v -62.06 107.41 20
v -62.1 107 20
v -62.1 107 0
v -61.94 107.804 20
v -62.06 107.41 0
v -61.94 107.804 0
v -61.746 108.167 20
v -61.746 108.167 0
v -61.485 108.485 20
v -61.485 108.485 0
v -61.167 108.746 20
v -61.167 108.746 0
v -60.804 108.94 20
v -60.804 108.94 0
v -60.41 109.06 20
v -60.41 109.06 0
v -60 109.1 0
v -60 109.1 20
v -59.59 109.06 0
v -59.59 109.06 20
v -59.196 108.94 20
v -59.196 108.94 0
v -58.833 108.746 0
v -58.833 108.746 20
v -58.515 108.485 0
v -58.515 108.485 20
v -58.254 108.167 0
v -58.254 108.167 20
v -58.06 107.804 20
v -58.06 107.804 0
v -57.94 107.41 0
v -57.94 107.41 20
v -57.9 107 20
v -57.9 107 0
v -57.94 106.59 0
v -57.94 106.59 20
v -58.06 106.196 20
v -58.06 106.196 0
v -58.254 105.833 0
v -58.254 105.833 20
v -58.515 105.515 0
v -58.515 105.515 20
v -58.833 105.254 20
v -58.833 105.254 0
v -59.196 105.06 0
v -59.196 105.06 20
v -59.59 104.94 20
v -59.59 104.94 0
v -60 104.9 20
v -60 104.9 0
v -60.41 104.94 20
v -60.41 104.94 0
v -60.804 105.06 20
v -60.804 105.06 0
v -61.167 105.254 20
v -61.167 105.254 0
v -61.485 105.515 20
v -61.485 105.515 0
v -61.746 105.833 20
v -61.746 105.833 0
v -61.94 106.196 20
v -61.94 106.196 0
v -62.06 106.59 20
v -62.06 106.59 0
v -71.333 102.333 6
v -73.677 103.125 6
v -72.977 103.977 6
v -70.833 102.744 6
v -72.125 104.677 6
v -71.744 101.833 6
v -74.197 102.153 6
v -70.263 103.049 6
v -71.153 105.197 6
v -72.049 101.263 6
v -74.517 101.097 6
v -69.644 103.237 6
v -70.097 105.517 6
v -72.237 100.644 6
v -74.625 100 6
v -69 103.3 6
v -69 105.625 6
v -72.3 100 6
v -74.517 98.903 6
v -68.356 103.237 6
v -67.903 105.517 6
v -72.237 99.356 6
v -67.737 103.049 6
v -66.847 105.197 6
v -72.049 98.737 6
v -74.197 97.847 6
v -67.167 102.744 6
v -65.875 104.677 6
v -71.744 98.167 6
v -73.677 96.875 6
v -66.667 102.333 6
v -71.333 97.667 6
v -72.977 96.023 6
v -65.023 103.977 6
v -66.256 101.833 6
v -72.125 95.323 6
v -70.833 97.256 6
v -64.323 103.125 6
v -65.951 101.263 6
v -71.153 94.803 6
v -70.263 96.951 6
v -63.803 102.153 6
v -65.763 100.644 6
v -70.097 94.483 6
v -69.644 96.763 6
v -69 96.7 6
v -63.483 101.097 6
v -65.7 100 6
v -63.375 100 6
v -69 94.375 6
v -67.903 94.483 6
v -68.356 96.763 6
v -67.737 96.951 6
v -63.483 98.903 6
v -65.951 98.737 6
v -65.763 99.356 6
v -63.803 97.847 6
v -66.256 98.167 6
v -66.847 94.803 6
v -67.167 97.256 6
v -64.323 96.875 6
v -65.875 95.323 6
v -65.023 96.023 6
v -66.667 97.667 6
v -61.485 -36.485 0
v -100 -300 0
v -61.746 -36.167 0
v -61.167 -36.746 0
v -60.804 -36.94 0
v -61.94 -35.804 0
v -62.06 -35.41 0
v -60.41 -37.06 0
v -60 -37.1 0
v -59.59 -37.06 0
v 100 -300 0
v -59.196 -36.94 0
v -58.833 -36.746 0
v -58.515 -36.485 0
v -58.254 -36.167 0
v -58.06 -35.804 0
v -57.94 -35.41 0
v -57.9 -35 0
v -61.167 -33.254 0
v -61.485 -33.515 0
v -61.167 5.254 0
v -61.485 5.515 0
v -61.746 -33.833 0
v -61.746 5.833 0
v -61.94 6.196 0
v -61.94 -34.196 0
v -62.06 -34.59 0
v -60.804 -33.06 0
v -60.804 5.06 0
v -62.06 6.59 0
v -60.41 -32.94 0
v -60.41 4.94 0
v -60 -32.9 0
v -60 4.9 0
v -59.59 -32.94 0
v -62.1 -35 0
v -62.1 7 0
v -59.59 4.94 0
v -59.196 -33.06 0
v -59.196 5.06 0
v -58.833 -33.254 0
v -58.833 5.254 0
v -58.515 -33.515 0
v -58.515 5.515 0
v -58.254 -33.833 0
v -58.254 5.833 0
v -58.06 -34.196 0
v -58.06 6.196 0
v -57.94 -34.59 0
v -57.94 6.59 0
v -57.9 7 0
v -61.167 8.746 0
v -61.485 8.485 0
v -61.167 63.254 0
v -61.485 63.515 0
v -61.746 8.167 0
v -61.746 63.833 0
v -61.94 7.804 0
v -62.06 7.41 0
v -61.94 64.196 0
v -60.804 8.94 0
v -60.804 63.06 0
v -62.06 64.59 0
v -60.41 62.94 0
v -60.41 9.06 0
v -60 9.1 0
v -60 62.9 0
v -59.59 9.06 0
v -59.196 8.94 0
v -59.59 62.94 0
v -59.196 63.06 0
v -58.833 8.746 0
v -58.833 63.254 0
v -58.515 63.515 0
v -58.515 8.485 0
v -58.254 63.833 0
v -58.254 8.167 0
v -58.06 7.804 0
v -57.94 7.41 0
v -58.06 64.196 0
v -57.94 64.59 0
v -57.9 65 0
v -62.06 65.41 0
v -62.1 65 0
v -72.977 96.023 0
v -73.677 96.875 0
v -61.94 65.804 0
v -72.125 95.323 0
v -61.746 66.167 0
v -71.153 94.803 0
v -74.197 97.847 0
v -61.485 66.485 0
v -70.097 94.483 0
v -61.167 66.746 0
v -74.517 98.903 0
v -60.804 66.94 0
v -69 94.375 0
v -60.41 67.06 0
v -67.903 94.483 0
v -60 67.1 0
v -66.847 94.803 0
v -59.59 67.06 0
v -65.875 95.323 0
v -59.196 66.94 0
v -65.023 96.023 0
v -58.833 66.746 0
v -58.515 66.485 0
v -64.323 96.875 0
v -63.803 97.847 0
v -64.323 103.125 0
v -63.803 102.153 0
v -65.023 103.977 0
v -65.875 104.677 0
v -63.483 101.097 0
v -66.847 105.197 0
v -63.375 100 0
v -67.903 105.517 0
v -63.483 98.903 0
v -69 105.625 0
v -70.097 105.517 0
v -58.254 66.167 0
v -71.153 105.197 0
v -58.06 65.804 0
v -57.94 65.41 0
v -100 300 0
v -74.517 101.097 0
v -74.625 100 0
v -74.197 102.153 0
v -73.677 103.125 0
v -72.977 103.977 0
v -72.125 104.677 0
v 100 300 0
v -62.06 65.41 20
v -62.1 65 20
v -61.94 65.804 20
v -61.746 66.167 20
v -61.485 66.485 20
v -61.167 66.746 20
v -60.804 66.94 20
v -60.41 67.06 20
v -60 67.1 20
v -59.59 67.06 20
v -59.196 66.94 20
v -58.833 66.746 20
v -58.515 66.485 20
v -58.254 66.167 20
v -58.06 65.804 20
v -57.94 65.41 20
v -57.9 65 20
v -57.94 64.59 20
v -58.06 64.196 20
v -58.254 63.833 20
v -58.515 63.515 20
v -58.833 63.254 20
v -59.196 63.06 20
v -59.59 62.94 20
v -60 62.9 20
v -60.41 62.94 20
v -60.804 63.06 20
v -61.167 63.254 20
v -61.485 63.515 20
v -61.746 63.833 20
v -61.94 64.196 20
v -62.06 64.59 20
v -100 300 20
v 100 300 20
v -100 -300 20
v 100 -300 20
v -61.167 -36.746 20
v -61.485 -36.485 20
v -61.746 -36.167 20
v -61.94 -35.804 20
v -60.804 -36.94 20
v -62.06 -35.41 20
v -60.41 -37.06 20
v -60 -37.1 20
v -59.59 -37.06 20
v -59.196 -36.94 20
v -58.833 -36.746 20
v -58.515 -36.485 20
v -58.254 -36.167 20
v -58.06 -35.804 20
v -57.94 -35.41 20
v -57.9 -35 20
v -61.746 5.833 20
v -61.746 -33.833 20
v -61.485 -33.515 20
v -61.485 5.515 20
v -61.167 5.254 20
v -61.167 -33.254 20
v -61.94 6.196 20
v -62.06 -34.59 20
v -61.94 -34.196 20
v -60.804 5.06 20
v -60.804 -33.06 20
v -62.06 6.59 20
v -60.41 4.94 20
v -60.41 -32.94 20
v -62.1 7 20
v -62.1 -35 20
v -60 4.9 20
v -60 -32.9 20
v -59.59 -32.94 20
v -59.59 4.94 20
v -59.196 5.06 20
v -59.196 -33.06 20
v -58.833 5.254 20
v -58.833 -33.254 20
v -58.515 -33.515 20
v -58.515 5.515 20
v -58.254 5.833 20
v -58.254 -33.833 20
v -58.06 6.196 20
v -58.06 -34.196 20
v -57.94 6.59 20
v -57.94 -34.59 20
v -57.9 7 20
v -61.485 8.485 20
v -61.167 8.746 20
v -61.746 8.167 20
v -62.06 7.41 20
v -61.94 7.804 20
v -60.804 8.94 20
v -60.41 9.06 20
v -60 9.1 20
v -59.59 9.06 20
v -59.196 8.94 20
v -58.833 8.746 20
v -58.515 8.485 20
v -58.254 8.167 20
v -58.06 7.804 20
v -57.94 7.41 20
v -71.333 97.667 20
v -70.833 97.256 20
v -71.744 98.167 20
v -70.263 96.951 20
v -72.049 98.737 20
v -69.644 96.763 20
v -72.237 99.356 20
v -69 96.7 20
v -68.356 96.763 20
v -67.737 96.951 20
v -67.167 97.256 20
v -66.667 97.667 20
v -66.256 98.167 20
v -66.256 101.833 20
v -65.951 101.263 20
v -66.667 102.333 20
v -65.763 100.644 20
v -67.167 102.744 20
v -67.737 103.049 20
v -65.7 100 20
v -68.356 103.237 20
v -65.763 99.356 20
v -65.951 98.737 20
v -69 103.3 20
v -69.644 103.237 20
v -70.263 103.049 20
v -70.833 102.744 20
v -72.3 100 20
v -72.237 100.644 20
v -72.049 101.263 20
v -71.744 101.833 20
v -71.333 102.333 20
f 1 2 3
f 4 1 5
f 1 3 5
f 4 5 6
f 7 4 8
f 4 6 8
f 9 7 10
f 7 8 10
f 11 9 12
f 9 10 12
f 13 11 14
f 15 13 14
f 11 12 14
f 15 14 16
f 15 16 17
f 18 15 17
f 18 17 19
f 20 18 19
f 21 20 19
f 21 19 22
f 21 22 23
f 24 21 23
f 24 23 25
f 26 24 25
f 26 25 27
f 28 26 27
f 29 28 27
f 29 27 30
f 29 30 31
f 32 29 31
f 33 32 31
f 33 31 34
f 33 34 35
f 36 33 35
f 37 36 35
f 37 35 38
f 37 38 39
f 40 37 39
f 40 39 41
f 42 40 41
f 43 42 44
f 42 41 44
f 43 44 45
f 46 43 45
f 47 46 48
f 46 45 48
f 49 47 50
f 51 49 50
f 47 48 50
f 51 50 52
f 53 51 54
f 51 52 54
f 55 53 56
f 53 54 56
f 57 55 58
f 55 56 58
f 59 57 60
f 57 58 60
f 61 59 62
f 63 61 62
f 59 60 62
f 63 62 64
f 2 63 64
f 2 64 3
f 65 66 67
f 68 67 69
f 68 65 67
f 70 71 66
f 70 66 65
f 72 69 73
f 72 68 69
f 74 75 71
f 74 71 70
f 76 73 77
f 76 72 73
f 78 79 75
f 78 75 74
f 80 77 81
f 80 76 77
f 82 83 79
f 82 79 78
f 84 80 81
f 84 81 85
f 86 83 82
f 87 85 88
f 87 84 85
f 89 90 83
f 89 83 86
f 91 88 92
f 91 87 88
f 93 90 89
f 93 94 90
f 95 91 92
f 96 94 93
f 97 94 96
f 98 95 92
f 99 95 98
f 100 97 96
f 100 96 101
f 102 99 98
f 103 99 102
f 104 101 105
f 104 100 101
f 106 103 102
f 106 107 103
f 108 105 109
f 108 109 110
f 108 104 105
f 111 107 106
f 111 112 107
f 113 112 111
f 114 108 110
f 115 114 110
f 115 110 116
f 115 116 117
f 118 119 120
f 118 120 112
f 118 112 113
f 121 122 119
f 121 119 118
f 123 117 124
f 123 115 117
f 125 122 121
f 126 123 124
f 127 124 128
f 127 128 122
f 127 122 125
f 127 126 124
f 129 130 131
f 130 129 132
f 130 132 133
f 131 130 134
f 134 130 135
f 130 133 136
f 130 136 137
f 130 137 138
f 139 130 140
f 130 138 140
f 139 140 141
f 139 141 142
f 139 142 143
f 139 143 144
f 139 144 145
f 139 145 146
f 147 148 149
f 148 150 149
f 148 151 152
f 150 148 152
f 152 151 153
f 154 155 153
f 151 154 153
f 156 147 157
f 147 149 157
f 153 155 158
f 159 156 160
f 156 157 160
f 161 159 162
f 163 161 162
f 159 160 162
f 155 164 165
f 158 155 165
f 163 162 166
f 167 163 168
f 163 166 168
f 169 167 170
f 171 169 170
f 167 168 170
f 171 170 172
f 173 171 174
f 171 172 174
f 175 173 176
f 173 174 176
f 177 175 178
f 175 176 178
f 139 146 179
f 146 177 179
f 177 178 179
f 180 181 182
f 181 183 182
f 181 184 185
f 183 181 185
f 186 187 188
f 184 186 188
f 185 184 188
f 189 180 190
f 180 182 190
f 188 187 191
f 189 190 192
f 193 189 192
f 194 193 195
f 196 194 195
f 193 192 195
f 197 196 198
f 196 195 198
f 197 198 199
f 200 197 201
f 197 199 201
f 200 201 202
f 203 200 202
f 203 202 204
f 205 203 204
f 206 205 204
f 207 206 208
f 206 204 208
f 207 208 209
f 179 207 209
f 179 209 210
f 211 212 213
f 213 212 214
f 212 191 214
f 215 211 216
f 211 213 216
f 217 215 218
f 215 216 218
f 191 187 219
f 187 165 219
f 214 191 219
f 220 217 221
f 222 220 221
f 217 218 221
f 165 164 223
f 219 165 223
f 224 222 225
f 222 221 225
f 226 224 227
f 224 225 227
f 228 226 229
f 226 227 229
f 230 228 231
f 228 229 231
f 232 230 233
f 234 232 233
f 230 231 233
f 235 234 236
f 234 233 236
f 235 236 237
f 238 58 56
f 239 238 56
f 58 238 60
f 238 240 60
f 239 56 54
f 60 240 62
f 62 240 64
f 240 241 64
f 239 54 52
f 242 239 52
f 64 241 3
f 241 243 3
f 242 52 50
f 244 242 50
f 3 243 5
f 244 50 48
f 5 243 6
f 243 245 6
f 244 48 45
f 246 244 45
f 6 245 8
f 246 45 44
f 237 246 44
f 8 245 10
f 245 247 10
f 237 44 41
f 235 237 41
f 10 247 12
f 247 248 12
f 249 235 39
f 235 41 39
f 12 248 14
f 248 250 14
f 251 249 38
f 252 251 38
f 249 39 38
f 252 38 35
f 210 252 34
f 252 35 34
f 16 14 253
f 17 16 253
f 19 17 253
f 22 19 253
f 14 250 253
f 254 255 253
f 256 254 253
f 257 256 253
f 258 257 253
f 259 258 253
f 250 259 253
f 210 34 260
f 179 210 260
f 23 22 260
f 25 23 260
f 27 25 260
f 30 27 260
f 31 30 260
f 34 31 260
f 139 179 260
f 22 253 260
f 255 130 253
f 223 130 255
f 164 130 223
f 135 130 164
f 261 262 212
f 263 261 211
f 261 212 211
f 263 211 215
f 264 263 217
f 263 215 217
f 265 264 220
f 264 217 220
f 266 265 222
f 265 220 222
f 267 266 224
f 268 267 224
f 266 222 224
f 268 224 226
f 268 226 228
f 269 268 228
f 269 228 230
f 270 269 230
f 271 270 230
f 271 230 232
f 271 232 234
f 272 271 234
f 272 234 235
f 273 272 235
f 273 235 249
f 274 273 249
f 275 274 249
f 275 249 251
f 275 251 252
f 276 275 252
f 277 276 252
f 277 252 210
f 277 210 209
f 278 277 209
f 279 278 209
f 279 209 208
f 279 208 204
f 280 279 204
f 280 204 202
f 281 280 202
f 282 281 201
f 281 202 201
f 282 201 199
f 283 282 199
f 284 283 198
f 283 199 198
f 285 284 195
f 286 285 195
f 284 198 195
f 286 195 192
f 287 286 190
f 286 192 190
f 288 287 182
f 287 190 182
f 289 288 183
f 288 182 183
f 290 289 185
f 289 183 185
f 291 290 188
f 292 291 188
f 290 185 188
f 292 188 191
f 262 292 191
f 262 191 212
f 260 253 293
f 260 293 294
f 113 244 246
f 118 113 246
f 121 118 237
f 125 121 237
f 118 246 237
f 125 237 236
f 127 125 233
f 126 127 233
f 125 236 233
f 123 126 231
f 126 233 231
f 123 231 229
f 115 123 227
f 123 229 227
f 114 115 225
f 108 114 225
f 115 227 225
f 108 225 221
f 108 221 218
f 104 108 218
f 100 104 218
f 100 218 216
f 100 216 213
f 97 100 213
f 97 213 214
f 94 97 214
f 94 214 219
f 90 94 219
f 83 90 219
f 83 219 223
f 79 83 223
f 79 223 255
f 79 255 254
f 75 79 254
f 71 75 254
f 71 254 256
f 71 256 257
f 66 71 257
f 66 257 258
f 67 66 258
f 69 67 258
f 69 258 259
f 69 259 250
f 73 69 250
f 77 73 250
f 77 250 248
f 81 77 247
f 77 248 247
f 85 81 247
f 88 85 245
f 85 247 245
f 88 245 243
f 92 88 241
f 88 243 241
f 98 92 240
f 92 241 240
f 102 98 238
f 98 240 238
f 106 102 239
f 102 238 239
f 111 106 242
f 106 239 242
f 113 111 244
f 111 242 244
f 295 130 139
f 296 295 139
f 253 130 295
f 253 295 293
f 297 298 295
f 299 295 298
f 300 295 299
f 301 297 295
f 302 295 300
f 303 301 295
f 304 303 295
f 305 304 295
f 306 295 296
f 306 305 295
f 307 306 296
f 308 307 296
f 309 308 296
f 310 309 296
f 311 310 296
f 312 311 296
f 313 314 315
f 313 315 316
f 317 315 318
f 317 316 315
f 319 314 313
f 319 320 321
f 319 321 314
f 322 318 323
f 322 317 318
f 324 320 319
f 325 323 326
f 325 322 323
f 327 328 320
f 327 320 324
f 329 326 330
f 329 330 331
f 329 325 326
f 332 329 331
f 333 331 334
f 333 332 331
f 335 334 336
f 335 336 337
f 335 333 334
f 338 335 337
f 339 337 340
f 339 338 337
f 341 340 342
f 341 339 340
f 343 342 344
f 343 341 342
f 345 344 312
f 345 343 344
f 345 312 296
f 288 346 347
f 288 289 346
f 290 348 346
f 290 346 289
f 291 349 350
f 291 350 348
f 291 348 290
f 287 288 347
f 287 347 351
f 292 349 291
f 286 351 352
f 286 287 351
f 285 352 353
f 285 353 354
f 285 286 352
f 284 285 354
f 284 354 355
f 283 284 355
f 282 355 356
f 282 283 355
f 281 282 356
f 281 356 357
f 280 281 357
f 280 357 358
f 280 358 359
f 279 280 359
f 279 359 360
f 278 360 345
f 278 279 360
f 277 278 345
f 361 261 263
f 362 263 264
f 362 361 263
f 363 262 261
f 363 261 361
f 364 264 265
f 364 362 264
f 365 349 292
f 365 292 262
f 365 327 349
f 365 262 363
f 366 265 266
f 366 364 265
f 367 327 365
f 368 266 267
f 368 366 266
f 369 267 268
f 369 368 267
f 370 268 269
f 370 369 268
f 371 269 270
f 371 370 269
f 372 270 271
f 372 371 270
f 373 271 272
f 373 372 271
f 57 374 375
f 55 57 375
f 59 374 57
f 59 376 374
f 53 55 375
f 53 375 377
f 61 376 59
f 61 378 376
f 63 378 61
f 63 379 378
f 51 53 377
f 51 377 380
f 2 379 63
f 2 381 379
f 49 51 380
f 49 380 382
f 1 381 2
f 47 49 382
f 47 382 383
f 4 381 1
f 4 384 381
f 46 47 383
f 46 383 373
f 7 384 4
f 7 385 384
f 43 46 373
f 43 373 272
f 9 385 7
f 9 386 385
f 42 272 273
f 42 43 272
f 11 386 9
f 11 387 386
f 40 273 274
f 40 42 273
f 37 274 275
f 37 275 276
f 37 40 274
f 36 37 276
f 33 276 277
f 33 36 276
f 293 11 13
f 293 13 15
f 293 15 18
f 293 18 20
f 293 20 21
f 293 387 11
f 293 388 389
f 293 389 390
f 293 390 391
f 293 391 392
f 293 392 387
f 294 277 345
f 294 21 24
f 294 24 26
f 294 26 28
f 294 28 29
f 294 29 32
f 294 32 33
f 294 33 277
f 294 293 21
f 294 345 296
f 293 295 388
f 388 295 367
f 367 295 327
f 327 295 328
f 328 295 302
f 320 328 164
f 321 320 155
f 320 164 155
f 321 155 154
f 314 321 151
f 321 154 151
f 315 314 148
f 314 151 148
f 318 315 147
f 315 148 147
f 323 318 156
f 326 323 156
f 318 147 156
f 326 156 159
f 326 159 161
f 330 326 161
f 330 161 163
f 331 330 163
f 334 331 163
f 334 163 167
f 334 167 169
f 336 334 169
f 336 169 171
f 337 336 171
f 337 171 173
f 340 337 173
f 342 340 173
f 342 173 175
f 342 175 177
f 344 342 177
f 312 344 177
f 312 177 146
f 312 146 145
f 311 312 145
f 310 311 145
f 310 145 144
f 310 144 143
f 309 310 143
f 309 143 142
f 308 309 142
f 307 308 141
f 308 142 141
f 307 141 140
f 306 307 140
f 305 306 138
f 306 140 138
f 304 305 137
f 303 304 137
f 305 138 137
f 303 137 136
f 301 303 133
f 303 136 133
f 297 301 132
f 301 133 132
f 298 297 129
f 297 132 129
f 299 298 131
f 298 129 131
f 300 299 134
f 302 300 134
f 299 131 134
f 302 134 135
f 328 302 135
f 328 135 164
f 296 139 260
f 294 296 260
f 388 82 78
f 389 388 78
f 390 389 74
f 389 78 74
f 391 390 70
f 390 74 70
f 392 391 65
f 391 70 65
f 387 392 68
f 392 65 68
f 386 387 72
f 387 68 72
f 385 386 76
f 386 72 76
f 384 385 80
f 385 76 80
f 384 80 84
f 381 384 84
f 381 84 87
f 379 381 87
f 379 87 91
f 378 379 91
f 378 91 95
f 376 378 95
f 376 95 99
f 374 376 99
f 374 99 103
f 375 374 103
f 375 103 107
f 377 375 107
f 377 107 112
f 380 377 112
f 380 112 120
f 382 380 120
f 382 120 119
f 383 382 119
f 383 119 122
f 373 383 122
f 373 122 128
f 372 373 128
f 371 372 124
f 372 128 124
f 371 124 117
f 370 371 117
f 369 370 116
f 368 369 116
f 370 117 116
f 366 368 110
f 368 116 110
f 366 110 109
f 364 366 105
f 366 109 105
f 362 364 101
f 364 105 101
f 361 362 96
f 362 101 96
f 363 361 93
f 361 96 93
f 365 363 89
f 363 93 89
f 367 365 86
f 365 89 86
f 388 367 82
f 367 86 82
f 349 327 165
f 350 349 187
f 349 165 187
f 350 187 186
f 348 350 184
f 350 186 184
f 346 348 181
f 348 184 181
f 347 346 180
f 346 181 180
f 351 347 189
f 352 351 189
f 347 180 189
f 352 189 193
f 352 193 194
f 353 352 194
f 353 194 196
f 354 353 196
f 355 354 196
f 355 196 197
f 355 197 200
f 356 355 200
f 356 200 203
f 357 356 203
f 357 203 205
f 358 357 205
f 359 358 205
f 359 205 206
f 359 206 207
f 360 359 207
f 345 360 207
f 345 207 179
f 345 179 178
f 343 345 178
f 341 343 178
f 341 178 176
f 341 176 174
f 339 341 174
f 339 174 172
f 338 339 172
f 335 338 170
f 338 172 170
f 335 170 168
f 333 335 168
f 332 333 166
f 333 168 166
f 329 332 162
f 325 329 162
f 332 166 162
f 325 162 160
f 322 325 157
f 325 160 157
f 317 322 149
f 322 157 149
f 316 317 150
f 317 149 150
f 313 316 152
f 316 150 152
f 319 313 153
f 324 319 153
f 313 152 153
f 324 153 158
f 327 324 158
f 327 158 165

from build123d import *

# Parameters (mm, degrees)
F0_W           = 200
F0_H           = 600
F1_DEPTH       = 20
F3_D           = 4.2
F4_D           = 6.6
F6_D           = 6.6
F6_CBORE_D     = 11.25
F6_CBORE_DEPTH = 6


with BuildPart() as f1:
    # F0 (on Top) → F1 (new body)
    with BuildSketch(Plane.XY):
        Rectangle(F0_W, F0_H)
    extrude(amount=F1_DEPTH)

    # F3 (through all)
    with Locations(Plane.XY.offset(20)):
        with Locations((-60, 107), (-60, 65), (-60, 7), (-60, -35)):
            Hole(F3_D / 2)

    # F4 (through all)
    with Locations(Plane.XY.offset(20)):
        with Locations((-69, 100)):
            Hole(F4_D / 2)

    # F6 (through all)
    with Locations(Plane(origin=(0, 0, 0), x_dir=(1, 0, 0), z_dir=(0, 0, -1))):
        with Locations((-69, -100)):
            CounterBoreHole(F6_D / 2, F6_CBORE_D / 2, F6_CBORE_DEPTH)


solid = f1.part
